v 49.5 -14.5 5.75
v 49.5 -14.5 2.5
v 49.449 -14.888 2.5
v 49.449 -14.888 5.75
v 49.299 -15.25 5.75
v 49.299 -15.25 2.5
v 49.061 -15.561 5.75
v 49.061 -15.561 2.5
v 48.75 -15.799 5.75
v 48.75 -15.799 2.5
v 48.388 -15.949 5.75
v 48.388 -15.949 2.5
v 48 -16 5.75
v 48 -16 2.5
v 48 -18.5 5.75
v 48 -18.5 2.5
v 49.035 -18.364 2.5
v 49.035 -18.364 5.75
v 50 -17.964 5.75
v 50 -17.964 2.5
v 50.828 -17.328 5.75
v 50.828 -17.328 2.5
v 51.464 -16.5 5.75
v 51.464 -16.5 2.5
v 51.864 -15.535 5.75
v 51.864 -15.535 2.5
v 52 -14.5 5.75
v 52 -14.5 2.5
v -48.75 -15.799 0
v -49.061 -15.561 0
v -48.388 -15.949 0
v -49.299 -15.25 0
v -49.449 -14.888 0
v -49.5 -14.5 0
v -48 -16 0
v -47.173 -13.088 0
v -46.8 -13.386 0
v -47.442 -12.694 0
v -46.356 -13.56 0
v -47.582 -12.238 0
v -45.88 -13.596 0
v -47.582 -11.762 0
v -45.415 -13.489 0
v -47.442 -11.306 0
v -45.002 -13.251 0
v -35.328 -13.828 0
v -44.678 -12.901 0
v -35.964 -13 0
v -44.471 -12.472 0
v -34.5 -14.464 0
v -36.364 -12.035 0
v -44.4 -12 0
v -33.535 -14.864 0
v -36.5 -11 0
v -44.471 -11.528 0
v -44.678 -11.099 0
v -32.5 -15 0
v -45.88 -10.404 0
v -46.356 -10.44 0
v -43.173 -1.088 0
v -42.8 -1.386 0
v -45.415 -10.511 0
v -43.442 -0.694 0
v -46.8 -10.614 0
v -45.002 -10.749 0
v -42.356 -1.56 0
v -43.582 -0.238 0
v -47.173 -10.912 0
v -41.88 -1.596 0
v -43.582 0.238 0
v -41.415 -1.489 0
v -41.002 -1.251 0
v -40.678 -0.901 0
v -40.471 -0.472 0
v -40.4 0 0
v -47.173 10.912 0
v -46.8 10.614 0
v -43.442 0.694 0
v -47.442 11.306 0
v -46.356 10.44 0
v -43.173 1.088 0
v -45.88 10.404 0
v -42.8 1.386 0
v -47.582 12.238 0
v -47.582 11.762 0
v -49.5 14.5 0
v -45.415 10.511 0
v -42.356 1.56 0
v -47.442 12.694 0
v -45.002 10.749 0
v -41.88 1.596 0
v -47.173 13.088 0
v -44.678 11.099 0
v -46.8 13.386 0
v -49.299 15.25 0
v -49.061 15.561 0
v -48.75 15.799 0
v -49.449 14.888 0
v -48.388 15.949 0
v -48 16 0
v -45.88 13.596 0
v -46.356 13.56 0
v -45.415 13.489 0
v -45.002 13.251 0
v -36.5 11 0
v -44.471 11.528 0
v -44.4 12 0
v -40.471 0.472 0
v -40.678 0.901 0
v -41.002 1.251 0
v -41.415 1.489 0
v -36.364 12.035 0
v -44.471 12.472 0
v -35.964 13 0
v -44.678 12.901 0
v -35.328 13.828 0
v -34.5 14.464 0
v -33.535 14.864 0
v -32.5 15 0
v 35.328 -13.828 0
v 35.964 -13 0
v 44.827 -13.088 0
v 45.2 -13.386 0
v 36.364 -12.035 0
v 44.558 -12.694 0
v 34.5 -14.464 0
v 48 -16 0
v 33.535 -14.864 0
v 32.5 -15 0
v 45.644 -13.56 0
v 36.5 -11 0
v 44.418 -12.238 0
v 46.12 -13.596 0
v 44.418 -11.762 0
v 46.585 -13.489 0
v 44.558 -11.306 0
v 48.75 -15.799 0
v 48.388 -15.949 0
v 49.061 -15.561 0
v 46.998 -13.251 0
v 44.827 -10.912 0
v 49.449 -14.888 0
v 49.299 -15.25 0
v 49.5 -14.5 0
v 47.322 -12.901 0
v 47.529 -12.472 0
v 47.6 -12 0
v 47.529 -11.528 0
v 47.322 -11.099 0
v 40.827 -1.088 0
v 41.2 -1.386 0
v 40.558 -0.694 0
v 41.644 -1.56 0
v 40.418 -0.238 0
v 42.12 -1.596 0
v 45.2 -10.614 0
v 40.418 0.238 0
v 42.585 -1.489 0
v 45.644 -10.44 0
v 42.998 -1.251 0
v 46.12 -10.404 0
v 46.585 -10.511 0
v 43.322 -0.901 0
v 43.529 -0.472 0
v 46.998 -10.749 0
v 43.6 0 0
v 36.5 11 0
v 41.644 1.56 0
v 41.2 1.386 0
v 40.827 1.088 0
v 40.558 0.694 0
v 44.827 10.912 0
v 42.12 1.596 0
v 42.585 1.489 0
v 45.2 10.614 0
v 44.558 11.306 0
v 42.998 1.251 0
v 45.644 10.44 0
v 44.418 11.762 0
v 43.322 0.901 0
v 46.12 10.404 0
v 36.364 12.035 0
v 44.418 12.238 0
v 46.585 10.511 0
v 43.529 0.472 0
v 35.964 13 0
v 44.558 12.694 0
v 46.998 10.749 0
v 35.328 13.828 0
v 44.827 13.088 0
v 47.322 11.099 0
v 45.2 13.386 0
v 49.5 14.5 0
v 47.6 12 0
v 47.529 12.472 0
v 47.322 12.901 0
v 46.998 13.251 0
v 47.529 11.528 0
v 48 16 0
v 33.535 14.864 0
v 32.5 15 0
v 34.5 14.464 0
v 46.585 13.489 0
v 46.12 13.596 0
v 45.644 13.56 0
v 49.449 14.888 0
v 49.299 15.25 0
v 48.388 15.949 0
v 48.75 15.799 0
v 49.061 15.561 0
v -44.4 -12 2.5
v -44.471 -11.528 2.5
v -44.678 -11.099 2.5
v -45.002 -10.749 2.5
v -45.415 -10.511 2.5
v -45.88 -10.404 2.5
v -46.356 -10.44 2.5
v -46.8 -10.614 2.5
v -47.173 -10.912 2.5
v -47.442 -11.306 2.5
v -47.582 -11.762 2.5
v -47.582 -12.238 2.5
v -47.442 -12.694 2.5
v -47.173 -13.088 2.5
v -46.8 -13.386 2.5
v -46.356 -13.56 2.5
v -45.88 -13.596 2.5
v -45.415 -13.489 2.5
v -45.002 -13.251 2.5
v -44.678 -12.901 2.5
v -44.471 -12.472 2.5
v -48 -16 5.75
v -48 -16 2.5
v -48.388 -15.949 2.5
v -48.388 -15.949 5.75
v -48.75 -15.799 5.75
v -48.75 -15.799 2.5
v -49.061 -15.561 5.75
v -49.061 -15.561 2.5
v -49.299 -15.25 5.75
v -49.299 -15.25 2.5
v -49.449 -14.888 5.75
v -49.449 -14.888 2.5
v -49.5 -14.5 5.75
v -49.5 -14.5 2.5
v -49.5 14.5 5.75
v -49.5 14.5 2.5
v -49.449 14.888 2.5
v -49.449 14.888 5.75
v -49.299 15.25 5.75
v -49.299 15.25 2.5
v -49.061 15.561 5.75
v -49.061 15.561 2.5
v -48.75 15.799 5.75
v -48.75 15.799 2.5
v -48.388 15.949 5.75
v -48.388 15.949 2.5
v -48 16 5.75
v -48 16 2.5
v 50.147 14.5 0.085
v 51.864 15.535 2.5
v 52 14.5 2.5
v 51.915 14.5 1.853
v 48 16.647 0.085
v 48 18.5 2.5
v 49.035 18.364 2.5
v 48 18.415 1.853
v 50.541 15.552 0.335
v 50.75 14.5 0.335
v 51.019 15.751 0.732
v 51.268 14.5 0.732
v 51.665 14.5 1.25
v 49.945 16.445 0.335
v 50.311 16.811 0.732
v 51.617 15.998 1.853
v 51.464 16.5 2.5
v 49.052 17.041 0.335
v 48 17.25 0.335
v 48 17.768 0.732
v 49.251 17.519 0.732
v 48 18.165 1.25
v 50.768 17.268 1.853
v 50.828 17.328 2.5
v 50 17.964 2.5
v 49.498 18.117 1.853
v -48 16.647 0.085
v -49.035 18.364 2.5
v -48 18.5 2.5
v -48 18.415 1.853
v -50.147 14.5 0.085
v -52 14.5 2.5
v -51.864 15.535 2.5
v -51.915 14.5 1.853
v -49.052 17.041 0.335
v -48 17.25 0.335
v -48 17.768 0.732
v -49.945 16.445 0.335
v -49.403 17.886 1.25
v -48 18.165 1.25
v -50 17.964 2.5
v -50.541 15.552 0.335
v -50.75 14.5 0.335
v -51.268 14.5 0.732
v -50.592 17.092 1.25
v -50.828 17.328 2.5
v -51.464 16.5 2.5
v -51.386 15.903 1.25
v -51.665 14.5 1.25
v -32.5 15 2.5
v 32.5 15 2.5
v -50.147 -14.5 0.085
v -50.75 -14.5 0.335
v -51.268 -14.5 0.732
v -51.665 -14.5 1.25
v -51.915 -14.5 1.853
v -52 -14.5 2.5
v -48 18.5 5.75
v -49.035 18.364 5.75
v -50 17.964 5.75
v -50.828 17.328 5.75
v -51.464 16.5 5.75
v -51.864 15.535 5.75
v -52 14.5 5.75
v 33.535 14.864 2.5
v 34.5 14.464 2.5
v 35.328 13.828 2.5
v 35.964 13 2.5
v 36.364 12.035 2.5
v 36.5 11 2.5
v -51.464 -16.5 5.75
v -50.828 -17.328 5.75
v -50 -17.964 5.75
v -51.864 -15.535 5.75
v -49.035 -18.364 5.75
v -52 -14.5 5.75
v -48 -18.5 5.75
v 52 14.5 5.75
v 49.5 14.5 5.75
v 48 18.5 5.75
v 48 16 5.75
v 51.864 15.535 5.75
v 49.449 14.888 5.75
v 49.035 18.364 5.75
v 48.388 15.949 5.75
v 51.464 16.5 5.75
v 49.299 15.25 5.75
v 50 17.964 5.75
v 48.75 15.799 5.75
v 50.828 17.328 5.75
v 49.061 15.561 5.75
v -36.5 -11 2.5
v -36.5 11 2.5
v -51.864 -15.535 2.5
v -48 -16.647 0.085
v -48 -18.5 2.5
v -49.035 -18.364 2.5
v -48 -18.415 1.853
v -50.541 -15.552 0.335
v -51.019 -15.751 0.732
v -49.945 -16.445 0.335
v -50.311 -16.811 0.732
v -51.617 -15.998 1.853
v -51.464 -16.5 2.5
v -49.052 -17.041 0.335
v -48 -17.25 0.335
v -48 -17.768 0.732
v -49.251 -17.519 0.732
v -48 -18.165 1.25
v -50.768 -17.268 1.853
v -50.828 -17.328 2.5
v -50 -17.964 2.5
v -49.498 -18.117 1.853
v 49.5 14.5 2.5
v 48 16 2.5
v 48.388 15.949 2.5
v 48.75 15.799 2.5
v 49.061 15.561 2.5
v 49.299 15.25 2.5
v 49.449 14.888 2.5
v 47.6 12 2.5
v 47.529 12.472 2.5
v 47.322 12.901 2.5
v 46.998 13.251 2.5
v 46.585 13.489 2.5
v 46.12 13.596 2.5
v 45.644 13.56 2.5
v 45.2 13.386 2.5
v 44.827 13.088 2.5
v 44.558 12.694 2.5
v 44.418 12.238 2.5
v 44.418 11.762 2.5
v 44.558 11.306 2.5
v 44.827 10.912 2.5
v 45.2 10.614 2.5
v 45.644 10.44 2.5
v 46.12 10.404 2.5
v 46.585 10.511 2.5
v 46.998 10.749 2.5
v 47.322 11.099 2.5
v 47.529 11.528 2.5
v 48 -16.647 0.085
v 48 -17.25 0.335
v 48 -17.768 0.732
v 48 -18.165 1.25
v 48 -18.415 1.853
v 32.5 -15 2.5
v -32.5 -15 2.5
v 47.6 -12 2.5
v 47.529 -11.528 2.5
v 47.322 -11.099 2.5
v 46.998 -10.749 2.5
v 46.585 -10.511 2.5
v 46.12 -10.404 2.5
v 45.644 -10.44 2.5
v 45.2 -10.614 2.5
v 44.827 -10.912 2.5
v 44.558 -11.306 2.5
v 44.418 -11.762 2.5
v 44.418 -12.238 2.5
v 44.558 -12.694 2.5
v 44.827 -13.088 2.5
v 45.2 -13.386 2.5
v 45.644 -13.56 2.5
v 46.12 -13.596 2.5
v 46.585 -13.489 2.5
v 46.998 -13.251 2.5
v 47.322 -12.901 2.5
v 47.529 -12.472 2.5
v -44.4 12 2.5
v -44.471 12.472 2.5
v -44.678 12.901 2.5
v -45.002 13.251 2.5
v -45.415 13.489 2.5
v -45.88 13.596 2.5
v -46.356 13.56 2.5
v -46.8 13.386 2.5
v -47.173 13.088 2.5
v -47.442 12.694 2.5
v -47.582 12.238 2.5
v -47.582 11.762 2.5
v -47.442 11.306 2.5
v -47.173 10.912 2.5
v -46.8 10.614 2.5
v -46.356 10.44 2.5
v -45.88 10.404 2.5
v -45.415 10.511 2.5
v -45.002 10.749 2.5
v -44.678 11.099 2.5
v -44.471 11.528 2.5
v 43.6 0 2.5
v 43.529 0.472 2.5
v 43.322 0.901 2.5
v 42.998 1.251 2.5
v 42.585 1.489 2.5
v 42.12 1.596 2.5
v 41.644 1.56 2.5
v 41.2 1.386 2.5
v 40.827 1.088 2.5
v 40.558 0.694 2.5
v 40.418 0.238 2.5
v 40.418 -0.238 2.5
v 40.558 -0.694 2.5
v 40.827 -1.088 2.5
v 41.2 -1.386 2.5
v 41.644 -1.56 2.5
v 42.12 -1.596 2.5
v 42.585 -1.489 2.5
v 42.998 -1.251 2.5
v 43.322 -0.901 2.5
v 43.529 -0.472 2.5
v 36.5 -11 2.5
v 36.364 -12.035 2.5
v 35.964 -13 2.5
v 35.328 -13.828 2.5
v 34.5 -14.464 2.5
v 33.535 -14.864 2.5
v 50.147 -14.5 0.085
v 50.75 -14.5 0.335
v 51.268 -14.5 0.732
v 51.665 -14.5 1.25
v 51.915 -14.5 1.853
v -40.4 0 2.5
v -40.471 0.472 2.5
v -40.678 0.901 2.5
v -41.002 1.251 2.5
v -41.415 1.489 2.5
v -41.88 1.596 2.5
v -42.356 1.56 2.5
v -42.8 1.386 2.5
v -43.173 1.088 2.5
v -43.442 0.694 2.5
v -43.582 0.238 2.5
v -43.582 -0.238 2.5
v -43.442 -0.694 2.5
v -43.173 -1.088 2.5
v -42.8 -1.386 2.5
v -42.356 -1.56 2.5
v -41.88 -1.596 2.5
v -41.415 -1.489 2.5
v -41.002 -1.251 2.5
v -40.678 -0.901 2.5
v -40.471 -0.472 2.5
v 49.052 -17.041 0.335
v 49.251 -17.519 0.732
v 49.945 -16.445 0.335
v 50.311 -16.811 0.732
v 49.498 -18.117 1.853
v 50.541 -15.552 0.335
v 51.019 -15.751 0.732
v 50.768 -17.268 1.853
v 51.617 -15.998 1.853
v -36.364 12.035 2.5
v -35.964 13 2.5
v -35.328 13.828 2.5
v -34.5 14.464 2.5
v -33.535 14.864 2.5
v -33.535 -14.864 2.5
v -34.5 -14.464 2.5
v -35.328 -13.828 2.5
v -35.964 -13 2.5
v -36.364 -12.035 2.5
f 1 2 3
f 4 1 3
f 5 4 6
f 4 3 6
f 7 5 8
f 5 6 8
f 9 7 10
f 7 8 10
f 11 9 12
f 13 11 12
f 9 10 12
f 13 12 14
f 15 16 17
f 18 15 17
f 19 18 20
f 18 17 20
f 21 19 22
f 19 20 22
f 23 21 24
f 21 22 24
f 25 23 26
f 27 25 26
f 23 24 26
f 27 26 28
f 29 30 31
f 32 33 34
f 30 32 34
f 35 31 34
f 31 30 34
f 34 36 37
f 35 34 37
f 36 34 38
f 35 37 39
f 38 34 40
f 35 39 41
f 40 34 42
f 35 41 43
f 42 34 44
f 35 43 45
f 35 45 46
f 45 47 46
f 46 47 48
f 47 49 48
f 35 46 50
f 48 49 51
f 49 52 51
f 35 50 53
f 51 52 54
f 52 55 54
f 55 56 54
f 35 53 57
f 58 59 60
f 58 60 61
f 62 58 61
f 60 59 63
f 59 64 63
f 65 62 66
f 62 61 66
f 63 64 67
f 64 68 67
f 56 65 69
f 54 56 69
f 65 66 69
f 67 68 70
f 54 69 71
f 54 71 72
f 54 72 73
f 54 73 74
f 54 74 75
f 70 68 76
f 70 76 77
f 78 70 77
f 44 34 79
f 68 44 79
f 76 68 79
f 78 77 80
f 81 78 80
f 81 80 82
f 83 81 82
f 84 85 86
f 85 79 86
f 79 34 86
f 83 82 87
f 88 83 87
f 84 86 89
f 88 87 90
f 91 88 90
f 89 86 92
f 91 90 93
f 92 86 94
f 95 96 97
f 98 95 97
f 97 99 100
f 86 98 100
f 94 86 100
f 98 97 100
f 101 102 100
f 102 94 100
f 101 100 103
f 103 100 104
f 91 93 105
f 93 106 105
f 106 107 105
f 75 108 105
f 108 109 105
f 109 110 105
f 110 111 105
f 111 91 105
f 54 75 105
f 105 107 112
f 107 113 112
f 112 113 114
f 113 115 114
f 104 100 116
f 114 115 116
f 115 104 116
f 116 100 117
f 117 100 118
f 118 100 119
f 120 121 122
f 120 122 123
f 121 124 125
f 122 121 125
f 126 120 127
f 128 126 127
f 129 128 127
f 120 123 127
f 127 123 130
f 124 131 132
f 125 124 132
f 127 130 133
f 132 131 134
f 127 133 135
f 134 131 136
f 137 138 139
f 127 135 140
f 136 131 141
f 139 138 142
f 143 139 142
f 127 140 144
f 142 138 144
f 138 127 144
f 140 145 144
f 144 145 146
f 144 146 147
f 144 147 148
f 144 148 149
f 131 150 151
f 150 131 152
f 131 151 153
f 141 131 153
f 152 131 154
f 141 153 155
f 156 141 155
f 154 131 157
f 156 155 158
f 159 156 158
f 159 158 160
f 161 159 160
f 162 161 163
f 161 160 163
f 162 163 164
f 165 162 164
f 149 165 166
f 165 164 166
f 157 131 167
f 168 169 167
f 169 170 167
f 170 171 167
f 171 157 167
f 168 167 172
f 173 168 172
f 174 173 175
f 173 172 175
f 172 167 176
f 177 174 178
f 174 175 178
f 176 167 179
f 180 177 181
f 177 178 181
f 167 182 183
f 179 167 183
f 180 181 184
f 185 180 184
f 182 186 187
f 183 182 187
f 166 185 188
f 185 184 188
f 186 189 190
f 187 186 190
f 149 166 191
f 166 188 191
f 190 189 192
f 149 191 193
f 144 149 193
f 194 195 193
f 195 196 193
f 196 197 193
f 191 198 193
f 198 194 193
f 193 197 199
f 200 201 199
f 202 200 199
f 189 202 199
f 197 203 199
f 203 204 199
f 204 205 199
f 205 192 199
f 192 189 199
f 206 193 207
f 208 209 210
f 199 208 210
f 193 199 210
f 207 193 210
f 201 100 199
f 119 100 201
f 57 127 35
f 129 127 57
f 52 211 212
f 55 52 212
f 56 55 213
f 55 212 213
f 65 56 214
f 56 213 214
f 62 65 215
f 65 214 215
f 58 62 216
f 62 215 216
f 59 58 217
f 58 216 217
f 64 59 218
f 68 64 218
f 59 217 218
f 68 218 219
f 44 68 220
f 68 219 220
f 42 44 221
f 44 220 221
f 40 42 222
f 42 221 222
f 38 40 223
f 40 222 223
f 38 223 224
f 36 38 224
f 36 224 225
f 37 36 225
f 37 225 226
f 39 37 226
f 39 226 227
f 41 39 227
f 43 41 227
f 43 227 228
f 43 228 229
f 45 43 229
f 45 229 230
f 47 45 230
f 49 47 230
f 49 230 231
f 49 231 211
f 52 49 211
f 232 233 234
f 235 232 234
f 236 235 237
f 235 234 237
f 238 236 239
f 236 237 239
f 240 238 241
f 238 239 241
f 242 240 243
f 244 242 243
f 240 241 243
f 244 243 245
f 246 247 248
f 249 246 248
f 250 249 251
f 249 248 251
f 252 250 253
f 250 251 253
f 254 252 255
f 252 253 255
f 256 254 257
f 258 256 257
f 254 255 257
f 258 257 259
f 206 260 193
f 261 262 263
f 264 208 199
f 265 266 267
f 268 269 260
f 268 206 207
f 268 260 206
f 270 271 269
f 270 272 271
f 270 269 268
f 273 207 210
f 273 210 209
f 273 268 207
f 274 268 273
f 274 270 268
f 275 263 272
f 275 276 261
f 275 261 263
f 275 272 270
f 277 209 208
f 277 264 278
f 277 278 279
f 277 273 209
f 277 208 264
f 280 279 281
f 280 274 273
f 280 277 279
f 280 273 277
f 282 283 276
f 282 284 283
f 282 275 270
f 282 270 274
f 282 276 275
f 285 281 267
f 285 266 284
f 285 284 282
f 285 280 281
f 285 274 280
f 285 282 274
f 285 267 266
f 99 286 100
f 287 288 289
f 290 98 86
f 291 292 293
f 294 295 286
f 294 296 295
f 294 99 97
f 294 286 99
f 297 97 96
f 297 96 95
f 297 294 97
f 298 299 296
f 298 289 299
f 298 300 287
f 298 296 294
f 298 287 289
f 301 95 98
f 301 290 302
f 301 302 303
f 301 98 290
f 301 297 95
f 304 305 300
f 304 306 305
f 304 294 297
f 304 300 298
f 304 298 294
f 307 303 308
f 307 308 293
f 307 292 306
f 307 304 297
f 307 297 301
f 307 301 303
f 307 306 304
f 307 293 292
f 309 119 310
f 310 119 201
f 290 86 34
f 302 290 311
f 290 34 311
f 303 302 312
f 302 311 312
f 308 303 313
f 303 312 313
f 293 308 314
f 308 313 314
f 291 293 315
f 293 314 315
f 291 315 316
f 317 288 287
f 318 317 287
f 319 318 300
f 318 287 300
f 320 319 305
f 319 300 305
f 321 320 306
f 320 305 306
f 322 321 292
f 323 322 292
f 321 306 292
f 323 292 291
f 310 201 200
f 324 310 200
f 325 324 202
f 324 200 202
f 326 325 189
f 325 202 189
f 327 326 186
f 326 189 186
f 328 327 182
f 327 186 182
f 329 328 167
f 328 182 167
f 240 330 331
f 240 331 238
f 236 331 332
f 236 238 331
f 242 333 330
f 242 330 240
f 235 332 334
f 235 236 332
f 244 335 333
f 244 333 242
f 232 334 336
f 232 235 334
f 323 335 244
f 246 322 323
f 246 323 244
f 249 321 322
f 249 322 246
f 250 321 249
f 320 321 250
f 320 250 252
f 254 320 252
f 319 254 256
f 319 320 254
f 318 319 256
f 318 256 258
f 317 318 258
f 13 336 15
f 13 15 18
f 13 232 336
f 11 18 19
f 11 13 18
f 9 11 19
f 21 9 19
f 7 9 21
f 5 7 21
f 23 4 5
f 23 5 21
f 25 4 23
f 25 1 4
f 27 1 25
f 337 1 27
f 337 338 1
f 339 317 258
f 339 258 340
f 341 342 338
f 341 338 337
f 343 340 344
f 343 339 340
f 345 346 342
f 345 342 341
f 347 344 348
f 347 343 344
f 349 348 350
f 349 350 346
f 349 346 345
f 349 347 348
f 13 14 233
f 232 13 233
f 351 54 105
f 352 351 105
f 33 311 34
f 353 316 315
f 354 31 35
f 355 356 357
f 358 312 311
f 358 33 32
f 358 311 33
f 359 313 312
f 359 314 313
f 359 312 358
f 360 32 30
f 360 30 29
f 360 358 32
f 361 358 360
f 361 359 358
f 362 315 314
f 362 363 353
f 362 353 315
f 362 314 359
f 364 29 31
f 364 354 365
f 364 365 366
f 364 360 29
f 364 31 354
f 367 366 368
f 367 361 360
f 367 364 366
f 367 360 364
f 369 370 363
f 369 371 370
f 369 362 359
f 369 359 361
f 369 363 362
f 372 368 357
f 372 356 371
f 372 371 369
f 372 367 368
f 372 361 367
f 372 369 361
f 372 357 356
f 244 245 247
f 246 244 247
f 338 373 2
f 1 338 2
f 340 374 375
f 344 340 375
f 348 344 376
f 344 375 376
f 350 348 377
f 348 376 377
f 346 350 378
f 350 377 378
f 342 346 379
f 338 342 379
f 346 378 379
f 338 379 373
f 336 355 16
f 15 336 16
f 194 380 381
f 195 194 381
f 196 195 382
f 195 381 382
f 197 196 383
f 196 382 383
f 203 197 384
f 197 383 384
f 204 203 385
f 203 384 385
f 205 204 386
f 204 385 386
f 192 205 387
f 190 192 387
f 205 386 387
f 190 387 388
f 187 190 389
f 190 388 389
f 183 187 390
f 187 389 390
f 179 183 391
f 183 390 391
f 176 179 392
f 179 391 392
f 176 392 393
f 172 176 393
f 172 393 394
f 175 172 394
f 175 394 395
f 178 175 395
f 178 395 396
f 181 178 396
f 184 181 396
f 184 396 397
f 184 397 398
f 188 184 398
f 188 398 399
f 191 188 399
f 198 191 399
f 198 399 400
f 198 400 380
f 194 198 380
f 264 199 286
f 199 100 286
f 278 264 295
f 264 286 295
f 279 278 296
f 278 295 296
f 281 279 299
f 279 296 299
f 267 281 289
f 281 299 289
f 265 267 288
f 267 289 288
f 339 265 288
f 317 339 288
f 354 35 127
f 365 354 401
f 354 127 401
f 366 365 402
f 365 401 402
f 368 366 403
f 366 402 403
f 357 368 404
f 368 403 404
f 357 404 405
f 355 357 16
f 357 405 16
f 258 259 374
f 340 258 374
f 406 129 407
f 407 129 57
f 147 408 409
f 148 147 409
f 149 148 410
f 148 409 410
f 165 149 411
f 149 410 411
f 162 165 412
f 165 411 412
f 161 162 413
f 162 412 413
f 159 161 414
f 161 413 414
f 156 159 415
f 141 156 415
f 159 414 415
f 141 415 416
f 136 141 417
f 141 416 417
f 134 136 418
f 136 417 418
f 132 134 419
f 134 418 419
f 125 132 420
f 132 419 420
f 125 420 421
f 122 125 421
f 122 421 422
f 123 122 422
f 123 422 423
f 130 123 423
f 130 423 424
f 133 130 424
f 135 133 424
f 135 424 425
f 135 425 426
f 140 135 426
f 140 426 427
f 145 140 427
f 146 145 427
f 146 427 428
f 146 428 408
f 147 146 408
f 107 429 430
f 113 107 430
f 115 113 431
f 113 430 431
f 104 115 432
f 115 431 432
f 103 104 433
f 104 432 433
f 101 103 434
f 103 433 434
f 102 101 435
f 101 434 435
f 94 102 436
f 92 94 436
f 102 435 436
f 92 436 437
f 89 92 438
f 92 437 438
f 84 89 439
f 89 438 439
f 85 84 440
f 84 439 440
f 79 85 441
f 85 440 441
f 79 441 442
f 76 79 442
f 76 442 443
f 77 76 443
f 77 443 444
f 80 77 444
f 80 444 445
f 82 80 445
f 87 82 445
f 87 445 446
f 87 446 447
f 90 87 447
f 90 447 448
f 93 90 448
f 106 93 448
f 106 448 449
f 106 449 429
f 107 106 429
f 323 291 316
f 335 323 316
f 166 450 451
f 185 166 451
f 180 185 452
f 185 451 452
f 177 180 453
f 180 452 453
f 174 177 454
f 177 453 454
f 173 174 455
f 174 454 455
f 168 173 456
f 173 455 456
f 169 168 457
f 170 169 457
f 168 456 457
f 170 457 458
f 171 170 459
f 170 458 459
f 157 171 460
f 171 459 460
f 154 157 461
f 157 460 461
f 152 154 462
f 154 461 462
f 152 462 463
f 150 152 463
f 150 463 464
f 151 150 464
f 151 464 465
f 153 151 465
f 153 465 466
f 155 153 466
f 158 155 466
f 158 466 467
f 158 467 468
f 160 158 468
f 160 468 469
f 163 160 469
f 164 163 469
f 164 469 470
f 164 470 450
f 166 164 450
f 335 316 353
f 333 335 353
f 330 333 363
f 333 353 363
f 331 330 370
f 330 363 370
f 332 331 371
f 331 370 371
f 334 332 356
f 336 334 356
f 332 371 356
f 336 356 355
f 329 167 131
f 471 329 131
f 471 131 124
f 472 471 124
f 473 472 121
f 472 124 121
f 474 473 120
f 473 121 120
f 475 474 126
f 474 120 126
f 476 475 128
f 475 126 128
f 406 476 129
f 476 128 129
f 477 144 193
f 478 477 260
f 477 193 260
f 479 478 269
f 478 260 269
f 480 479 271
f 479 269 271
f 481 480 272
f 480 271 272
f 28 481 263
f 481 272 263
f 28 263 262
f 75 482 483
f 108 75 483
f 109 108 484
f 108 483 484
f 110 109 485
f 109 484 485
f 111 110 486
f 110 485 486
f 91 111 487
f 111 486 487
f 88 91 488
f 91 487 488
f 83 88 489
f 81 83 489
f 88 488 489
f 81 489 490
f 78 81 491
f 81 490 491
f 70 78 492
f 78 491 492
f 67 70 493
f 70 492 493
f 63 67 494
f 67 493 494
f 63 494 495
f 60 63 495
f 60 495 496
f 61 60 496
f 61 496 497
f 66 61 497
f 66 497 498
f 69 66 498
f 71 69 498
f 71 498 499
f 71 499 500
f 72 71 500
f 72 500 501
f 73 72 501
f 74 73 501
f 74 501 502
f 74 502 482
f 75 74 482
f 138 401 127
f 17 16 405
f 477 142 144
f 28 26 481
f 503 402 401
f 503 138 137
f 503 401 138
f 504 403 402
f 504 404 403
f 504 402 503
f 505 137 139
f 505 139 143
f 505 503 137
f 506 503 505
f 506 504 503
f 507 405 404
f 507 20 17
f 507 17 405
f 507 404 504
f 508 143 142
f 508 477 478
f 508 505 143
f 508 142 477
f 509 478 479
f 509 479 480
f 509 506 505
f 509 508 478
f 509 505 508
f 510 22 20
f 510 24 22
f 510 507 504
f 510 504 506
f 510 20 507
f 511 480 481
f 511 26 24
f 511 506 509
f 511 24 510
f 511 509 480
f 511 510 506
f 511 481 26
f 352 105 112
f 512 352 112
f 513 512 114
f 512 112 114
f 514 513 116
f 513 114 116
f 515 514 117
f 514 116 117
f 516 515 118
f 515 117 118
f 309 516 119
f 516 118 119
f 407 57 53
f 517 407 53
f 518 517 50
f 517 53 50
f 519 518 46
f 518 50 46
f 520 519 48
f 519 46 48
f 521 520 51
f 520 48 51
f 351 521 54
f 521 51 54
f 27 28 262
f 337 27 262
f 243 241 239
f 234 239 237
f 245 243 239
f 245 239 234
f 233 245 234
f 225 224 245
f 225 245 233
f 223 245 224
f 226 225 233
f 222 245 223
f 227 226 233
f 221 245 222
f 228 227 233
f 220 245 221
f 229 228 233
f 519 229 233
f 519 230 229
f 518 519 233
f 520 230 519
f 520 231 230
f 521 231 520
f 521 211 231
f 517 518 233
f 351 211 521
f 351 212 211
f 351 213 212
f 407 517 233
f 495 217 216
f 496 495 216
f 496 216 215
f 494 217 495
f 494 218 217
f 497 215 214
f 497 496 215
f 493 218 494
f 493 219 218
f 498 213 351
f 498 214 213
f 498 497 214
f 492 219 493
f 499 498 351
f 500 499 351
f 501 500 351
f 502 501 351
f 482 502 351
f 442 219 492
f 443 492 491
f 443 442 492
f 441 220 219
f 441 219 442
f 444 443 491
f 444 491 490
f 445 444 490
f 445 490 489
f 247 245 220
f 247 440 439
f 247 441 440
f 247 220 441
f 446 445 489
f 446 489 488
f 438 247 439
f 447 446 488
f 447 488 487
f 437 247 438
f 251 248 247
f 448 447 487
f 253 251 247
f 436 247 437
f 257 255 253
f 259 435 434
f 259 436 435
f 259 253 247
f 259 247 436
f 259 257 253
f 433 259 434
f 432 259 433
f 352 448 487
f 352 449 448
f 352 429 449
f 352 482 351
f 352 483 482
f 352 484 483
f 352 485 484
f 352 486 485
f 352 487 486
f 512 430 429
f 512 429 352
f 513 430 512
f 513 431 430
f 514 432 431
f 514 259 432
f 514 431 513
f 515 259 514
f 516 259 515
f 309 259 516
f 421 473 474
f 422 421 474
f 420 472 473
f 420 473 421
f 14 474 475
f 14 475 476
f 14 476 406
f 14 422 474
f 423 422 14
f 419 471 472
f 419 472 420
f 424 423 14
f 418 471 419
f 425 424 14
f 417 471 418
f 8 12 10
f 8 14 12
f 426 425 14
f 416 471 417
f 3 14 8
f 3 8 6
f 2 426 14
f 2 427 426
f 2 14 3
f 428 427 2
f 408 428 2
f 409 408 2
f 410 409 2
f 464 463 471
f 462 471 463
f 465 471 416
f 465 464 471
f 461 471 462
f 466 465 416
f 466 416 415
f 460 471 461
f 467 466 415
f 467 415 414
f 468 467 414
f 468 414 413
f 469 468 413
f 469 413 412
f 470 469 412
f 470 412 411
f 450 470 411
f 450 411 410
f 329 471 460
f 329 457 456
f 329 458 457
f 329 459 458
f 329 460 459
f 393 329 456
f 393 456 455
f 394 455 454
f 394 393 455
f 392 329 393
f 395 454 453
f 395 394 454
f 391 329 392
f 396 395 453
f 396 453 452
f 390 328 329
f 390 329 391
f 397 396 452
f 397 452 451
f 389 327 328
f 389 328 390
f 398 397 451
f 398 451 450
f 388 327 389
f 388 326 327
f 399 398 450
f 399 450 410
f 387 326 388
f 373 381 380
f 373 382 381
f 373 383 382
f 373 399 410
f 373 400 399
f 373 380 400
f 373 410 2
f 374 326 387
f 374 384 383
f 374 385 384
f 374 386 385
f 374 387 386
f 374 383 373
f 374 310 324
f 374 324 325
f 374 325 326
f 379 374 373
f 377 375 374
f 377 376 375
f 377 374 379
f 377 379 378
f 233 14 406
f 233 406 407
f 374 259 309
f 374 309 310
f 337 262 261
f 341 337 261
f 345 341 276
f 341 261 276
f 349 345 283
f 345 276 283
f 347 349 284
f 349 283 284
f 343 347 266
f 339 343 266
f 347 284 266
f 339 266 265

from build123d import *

# Parameters (mm, degrees)
F1_DEPTH = 2.5
F2_R     = 1.6
F3_DEPTH = 2.501
F5_DEPTH = 3.25
F6_R     = 2.5


with BuildPart() as f1:
    # F0 (on Top) → F1 (new body)
    with BuildSketch(Plane.XY):
        with BuildLine():
            ThreePointArc((52, 14.5), (50.828427, 17.328427), (48, 18.5))
            Line((48, 18.5), (-48, 18.5))
            ThreePointArc((-48, 18.5), (-50.828427, 17.328427), (-52, 14.5))
            Line((-52, 14.5), (-52, -14.5))
            ThreePointArc((-52, -14.5), (-50.828427, -17.328427), (-48, -18.5))
            Line((-48, -18.5), (48, -18.5))
            ThreePointArc((48, -18.5), (50.828427, -17.328427), (52, -14.5))
            Line((52, -14.5), (52, 14.5))
        make_face()
        with BuildLine():
            Line((-32.5, 15), (32.5, 15))
            ThreePointArc((32.5, 15), (35.328427, 13.828427), (36.5, 11))
            Line((36.5, 11), (36.5, -11))
            ThreePointArc((36.5, -11), (35.328427, -13.828427), (32.5, -15))
            Line((32.5, -15), (-32.5, -15))
            ThreePointArc((-32.5, -15), (-35.328427, -13.828427), (-36.5, -11))
            Line((-36.5, -11), (-36.5, 11))
            ThreePointArc((-36.5, 11), (-35.328427, 13.828427), (-32.5, 15))
        make_face(mode=Mode.SUBTRACT)
    extrude(amount=F1_DEPTH)

    # F2 (on face) → F3 (cut, through all)
    with BuildSketch(Plane.XY.offset(2.5)):
        with Locations((-46, 12)):
            Circle(F2_R)
        with Locations((46, 12)):
            Circle(F2_R)
        with Locations((46, -12)):
            Circle(F2_R)
        with Locations((-46, -12)):
            Circle(F2_R)
        with Locations((-42, 0)):
            Circle(F2_R)
        with Locations((42, 0)):
            Circle(F2_R)
    extrude(amount=-F3_DEPTH, mode=Mode.SUBTRACT)

    # F4 (on face) → F5 (join)
    with BuildSketch(Plane.XY.offset(2.5)):
        with BuildLine():
            Line((48, 18.5), (-48, 18.5))
            ThreePointArc((-48, 18.5), (-50.828427, 17.328427), (-52, 14.5))
            Line((-52, 14.5), (-52, -14.5))
            ThreePointArc((-52, -14.5), (-50.828427, -17.328427), (-48, -18.5))
            Line((-48, -18.5), (48, -18.5))
            ThreePointArc((48, -18.5), (50.828427, -17.328427), (52, -14.5))
            Line((52, -14.5), (52, 14.5))
            ThreePointArc((52, 14.5), (50.828427, 17.328427), (48, 18.5))
        make_face()
        with BuildLine():
            Line((-49.5, -14.5), (-49.5, 14.5))
            ThreePointArc((-49.5, 14.5), (-49.06066, 15.56066), (-48, 16))
            Line((-48, 16), (48, 16))
            ThreePointArc((48, 16), (49.06066, 15.56066), (49.5, 14.5))
            Line((49.5, 14.5), (49.5, -14.5))
            ThreePointArc((49.5, -14.5), (49.06066, -15.56066), (48, -16))
            Line((48, -16), (-48, -16))
            ThreePointArc((-48, -16), (-49.06066, -15.56066), (-49.5, -14.5))
        make_face(mode=Mode.SUBTRACT)
    extrude(amount=F5_DEPTH)

    # F6
    f6_edges = [f1.edges().sort_by_distance(p)[0] for p in [
        (-50.828427, 17.328427, 0),
        (0, 18.5, 0),
        (-52, 0, 0),
        (-50.828427, -17.328427, 0),
        (0, -18.5, 0),
        (50.828427, -17.328427, 0),
        (52, 0, 0),
        (50.828427, 17.328427, 0),
    ]]
    fillet(f6_edges, radius=F6_R)


solid = f1.part
